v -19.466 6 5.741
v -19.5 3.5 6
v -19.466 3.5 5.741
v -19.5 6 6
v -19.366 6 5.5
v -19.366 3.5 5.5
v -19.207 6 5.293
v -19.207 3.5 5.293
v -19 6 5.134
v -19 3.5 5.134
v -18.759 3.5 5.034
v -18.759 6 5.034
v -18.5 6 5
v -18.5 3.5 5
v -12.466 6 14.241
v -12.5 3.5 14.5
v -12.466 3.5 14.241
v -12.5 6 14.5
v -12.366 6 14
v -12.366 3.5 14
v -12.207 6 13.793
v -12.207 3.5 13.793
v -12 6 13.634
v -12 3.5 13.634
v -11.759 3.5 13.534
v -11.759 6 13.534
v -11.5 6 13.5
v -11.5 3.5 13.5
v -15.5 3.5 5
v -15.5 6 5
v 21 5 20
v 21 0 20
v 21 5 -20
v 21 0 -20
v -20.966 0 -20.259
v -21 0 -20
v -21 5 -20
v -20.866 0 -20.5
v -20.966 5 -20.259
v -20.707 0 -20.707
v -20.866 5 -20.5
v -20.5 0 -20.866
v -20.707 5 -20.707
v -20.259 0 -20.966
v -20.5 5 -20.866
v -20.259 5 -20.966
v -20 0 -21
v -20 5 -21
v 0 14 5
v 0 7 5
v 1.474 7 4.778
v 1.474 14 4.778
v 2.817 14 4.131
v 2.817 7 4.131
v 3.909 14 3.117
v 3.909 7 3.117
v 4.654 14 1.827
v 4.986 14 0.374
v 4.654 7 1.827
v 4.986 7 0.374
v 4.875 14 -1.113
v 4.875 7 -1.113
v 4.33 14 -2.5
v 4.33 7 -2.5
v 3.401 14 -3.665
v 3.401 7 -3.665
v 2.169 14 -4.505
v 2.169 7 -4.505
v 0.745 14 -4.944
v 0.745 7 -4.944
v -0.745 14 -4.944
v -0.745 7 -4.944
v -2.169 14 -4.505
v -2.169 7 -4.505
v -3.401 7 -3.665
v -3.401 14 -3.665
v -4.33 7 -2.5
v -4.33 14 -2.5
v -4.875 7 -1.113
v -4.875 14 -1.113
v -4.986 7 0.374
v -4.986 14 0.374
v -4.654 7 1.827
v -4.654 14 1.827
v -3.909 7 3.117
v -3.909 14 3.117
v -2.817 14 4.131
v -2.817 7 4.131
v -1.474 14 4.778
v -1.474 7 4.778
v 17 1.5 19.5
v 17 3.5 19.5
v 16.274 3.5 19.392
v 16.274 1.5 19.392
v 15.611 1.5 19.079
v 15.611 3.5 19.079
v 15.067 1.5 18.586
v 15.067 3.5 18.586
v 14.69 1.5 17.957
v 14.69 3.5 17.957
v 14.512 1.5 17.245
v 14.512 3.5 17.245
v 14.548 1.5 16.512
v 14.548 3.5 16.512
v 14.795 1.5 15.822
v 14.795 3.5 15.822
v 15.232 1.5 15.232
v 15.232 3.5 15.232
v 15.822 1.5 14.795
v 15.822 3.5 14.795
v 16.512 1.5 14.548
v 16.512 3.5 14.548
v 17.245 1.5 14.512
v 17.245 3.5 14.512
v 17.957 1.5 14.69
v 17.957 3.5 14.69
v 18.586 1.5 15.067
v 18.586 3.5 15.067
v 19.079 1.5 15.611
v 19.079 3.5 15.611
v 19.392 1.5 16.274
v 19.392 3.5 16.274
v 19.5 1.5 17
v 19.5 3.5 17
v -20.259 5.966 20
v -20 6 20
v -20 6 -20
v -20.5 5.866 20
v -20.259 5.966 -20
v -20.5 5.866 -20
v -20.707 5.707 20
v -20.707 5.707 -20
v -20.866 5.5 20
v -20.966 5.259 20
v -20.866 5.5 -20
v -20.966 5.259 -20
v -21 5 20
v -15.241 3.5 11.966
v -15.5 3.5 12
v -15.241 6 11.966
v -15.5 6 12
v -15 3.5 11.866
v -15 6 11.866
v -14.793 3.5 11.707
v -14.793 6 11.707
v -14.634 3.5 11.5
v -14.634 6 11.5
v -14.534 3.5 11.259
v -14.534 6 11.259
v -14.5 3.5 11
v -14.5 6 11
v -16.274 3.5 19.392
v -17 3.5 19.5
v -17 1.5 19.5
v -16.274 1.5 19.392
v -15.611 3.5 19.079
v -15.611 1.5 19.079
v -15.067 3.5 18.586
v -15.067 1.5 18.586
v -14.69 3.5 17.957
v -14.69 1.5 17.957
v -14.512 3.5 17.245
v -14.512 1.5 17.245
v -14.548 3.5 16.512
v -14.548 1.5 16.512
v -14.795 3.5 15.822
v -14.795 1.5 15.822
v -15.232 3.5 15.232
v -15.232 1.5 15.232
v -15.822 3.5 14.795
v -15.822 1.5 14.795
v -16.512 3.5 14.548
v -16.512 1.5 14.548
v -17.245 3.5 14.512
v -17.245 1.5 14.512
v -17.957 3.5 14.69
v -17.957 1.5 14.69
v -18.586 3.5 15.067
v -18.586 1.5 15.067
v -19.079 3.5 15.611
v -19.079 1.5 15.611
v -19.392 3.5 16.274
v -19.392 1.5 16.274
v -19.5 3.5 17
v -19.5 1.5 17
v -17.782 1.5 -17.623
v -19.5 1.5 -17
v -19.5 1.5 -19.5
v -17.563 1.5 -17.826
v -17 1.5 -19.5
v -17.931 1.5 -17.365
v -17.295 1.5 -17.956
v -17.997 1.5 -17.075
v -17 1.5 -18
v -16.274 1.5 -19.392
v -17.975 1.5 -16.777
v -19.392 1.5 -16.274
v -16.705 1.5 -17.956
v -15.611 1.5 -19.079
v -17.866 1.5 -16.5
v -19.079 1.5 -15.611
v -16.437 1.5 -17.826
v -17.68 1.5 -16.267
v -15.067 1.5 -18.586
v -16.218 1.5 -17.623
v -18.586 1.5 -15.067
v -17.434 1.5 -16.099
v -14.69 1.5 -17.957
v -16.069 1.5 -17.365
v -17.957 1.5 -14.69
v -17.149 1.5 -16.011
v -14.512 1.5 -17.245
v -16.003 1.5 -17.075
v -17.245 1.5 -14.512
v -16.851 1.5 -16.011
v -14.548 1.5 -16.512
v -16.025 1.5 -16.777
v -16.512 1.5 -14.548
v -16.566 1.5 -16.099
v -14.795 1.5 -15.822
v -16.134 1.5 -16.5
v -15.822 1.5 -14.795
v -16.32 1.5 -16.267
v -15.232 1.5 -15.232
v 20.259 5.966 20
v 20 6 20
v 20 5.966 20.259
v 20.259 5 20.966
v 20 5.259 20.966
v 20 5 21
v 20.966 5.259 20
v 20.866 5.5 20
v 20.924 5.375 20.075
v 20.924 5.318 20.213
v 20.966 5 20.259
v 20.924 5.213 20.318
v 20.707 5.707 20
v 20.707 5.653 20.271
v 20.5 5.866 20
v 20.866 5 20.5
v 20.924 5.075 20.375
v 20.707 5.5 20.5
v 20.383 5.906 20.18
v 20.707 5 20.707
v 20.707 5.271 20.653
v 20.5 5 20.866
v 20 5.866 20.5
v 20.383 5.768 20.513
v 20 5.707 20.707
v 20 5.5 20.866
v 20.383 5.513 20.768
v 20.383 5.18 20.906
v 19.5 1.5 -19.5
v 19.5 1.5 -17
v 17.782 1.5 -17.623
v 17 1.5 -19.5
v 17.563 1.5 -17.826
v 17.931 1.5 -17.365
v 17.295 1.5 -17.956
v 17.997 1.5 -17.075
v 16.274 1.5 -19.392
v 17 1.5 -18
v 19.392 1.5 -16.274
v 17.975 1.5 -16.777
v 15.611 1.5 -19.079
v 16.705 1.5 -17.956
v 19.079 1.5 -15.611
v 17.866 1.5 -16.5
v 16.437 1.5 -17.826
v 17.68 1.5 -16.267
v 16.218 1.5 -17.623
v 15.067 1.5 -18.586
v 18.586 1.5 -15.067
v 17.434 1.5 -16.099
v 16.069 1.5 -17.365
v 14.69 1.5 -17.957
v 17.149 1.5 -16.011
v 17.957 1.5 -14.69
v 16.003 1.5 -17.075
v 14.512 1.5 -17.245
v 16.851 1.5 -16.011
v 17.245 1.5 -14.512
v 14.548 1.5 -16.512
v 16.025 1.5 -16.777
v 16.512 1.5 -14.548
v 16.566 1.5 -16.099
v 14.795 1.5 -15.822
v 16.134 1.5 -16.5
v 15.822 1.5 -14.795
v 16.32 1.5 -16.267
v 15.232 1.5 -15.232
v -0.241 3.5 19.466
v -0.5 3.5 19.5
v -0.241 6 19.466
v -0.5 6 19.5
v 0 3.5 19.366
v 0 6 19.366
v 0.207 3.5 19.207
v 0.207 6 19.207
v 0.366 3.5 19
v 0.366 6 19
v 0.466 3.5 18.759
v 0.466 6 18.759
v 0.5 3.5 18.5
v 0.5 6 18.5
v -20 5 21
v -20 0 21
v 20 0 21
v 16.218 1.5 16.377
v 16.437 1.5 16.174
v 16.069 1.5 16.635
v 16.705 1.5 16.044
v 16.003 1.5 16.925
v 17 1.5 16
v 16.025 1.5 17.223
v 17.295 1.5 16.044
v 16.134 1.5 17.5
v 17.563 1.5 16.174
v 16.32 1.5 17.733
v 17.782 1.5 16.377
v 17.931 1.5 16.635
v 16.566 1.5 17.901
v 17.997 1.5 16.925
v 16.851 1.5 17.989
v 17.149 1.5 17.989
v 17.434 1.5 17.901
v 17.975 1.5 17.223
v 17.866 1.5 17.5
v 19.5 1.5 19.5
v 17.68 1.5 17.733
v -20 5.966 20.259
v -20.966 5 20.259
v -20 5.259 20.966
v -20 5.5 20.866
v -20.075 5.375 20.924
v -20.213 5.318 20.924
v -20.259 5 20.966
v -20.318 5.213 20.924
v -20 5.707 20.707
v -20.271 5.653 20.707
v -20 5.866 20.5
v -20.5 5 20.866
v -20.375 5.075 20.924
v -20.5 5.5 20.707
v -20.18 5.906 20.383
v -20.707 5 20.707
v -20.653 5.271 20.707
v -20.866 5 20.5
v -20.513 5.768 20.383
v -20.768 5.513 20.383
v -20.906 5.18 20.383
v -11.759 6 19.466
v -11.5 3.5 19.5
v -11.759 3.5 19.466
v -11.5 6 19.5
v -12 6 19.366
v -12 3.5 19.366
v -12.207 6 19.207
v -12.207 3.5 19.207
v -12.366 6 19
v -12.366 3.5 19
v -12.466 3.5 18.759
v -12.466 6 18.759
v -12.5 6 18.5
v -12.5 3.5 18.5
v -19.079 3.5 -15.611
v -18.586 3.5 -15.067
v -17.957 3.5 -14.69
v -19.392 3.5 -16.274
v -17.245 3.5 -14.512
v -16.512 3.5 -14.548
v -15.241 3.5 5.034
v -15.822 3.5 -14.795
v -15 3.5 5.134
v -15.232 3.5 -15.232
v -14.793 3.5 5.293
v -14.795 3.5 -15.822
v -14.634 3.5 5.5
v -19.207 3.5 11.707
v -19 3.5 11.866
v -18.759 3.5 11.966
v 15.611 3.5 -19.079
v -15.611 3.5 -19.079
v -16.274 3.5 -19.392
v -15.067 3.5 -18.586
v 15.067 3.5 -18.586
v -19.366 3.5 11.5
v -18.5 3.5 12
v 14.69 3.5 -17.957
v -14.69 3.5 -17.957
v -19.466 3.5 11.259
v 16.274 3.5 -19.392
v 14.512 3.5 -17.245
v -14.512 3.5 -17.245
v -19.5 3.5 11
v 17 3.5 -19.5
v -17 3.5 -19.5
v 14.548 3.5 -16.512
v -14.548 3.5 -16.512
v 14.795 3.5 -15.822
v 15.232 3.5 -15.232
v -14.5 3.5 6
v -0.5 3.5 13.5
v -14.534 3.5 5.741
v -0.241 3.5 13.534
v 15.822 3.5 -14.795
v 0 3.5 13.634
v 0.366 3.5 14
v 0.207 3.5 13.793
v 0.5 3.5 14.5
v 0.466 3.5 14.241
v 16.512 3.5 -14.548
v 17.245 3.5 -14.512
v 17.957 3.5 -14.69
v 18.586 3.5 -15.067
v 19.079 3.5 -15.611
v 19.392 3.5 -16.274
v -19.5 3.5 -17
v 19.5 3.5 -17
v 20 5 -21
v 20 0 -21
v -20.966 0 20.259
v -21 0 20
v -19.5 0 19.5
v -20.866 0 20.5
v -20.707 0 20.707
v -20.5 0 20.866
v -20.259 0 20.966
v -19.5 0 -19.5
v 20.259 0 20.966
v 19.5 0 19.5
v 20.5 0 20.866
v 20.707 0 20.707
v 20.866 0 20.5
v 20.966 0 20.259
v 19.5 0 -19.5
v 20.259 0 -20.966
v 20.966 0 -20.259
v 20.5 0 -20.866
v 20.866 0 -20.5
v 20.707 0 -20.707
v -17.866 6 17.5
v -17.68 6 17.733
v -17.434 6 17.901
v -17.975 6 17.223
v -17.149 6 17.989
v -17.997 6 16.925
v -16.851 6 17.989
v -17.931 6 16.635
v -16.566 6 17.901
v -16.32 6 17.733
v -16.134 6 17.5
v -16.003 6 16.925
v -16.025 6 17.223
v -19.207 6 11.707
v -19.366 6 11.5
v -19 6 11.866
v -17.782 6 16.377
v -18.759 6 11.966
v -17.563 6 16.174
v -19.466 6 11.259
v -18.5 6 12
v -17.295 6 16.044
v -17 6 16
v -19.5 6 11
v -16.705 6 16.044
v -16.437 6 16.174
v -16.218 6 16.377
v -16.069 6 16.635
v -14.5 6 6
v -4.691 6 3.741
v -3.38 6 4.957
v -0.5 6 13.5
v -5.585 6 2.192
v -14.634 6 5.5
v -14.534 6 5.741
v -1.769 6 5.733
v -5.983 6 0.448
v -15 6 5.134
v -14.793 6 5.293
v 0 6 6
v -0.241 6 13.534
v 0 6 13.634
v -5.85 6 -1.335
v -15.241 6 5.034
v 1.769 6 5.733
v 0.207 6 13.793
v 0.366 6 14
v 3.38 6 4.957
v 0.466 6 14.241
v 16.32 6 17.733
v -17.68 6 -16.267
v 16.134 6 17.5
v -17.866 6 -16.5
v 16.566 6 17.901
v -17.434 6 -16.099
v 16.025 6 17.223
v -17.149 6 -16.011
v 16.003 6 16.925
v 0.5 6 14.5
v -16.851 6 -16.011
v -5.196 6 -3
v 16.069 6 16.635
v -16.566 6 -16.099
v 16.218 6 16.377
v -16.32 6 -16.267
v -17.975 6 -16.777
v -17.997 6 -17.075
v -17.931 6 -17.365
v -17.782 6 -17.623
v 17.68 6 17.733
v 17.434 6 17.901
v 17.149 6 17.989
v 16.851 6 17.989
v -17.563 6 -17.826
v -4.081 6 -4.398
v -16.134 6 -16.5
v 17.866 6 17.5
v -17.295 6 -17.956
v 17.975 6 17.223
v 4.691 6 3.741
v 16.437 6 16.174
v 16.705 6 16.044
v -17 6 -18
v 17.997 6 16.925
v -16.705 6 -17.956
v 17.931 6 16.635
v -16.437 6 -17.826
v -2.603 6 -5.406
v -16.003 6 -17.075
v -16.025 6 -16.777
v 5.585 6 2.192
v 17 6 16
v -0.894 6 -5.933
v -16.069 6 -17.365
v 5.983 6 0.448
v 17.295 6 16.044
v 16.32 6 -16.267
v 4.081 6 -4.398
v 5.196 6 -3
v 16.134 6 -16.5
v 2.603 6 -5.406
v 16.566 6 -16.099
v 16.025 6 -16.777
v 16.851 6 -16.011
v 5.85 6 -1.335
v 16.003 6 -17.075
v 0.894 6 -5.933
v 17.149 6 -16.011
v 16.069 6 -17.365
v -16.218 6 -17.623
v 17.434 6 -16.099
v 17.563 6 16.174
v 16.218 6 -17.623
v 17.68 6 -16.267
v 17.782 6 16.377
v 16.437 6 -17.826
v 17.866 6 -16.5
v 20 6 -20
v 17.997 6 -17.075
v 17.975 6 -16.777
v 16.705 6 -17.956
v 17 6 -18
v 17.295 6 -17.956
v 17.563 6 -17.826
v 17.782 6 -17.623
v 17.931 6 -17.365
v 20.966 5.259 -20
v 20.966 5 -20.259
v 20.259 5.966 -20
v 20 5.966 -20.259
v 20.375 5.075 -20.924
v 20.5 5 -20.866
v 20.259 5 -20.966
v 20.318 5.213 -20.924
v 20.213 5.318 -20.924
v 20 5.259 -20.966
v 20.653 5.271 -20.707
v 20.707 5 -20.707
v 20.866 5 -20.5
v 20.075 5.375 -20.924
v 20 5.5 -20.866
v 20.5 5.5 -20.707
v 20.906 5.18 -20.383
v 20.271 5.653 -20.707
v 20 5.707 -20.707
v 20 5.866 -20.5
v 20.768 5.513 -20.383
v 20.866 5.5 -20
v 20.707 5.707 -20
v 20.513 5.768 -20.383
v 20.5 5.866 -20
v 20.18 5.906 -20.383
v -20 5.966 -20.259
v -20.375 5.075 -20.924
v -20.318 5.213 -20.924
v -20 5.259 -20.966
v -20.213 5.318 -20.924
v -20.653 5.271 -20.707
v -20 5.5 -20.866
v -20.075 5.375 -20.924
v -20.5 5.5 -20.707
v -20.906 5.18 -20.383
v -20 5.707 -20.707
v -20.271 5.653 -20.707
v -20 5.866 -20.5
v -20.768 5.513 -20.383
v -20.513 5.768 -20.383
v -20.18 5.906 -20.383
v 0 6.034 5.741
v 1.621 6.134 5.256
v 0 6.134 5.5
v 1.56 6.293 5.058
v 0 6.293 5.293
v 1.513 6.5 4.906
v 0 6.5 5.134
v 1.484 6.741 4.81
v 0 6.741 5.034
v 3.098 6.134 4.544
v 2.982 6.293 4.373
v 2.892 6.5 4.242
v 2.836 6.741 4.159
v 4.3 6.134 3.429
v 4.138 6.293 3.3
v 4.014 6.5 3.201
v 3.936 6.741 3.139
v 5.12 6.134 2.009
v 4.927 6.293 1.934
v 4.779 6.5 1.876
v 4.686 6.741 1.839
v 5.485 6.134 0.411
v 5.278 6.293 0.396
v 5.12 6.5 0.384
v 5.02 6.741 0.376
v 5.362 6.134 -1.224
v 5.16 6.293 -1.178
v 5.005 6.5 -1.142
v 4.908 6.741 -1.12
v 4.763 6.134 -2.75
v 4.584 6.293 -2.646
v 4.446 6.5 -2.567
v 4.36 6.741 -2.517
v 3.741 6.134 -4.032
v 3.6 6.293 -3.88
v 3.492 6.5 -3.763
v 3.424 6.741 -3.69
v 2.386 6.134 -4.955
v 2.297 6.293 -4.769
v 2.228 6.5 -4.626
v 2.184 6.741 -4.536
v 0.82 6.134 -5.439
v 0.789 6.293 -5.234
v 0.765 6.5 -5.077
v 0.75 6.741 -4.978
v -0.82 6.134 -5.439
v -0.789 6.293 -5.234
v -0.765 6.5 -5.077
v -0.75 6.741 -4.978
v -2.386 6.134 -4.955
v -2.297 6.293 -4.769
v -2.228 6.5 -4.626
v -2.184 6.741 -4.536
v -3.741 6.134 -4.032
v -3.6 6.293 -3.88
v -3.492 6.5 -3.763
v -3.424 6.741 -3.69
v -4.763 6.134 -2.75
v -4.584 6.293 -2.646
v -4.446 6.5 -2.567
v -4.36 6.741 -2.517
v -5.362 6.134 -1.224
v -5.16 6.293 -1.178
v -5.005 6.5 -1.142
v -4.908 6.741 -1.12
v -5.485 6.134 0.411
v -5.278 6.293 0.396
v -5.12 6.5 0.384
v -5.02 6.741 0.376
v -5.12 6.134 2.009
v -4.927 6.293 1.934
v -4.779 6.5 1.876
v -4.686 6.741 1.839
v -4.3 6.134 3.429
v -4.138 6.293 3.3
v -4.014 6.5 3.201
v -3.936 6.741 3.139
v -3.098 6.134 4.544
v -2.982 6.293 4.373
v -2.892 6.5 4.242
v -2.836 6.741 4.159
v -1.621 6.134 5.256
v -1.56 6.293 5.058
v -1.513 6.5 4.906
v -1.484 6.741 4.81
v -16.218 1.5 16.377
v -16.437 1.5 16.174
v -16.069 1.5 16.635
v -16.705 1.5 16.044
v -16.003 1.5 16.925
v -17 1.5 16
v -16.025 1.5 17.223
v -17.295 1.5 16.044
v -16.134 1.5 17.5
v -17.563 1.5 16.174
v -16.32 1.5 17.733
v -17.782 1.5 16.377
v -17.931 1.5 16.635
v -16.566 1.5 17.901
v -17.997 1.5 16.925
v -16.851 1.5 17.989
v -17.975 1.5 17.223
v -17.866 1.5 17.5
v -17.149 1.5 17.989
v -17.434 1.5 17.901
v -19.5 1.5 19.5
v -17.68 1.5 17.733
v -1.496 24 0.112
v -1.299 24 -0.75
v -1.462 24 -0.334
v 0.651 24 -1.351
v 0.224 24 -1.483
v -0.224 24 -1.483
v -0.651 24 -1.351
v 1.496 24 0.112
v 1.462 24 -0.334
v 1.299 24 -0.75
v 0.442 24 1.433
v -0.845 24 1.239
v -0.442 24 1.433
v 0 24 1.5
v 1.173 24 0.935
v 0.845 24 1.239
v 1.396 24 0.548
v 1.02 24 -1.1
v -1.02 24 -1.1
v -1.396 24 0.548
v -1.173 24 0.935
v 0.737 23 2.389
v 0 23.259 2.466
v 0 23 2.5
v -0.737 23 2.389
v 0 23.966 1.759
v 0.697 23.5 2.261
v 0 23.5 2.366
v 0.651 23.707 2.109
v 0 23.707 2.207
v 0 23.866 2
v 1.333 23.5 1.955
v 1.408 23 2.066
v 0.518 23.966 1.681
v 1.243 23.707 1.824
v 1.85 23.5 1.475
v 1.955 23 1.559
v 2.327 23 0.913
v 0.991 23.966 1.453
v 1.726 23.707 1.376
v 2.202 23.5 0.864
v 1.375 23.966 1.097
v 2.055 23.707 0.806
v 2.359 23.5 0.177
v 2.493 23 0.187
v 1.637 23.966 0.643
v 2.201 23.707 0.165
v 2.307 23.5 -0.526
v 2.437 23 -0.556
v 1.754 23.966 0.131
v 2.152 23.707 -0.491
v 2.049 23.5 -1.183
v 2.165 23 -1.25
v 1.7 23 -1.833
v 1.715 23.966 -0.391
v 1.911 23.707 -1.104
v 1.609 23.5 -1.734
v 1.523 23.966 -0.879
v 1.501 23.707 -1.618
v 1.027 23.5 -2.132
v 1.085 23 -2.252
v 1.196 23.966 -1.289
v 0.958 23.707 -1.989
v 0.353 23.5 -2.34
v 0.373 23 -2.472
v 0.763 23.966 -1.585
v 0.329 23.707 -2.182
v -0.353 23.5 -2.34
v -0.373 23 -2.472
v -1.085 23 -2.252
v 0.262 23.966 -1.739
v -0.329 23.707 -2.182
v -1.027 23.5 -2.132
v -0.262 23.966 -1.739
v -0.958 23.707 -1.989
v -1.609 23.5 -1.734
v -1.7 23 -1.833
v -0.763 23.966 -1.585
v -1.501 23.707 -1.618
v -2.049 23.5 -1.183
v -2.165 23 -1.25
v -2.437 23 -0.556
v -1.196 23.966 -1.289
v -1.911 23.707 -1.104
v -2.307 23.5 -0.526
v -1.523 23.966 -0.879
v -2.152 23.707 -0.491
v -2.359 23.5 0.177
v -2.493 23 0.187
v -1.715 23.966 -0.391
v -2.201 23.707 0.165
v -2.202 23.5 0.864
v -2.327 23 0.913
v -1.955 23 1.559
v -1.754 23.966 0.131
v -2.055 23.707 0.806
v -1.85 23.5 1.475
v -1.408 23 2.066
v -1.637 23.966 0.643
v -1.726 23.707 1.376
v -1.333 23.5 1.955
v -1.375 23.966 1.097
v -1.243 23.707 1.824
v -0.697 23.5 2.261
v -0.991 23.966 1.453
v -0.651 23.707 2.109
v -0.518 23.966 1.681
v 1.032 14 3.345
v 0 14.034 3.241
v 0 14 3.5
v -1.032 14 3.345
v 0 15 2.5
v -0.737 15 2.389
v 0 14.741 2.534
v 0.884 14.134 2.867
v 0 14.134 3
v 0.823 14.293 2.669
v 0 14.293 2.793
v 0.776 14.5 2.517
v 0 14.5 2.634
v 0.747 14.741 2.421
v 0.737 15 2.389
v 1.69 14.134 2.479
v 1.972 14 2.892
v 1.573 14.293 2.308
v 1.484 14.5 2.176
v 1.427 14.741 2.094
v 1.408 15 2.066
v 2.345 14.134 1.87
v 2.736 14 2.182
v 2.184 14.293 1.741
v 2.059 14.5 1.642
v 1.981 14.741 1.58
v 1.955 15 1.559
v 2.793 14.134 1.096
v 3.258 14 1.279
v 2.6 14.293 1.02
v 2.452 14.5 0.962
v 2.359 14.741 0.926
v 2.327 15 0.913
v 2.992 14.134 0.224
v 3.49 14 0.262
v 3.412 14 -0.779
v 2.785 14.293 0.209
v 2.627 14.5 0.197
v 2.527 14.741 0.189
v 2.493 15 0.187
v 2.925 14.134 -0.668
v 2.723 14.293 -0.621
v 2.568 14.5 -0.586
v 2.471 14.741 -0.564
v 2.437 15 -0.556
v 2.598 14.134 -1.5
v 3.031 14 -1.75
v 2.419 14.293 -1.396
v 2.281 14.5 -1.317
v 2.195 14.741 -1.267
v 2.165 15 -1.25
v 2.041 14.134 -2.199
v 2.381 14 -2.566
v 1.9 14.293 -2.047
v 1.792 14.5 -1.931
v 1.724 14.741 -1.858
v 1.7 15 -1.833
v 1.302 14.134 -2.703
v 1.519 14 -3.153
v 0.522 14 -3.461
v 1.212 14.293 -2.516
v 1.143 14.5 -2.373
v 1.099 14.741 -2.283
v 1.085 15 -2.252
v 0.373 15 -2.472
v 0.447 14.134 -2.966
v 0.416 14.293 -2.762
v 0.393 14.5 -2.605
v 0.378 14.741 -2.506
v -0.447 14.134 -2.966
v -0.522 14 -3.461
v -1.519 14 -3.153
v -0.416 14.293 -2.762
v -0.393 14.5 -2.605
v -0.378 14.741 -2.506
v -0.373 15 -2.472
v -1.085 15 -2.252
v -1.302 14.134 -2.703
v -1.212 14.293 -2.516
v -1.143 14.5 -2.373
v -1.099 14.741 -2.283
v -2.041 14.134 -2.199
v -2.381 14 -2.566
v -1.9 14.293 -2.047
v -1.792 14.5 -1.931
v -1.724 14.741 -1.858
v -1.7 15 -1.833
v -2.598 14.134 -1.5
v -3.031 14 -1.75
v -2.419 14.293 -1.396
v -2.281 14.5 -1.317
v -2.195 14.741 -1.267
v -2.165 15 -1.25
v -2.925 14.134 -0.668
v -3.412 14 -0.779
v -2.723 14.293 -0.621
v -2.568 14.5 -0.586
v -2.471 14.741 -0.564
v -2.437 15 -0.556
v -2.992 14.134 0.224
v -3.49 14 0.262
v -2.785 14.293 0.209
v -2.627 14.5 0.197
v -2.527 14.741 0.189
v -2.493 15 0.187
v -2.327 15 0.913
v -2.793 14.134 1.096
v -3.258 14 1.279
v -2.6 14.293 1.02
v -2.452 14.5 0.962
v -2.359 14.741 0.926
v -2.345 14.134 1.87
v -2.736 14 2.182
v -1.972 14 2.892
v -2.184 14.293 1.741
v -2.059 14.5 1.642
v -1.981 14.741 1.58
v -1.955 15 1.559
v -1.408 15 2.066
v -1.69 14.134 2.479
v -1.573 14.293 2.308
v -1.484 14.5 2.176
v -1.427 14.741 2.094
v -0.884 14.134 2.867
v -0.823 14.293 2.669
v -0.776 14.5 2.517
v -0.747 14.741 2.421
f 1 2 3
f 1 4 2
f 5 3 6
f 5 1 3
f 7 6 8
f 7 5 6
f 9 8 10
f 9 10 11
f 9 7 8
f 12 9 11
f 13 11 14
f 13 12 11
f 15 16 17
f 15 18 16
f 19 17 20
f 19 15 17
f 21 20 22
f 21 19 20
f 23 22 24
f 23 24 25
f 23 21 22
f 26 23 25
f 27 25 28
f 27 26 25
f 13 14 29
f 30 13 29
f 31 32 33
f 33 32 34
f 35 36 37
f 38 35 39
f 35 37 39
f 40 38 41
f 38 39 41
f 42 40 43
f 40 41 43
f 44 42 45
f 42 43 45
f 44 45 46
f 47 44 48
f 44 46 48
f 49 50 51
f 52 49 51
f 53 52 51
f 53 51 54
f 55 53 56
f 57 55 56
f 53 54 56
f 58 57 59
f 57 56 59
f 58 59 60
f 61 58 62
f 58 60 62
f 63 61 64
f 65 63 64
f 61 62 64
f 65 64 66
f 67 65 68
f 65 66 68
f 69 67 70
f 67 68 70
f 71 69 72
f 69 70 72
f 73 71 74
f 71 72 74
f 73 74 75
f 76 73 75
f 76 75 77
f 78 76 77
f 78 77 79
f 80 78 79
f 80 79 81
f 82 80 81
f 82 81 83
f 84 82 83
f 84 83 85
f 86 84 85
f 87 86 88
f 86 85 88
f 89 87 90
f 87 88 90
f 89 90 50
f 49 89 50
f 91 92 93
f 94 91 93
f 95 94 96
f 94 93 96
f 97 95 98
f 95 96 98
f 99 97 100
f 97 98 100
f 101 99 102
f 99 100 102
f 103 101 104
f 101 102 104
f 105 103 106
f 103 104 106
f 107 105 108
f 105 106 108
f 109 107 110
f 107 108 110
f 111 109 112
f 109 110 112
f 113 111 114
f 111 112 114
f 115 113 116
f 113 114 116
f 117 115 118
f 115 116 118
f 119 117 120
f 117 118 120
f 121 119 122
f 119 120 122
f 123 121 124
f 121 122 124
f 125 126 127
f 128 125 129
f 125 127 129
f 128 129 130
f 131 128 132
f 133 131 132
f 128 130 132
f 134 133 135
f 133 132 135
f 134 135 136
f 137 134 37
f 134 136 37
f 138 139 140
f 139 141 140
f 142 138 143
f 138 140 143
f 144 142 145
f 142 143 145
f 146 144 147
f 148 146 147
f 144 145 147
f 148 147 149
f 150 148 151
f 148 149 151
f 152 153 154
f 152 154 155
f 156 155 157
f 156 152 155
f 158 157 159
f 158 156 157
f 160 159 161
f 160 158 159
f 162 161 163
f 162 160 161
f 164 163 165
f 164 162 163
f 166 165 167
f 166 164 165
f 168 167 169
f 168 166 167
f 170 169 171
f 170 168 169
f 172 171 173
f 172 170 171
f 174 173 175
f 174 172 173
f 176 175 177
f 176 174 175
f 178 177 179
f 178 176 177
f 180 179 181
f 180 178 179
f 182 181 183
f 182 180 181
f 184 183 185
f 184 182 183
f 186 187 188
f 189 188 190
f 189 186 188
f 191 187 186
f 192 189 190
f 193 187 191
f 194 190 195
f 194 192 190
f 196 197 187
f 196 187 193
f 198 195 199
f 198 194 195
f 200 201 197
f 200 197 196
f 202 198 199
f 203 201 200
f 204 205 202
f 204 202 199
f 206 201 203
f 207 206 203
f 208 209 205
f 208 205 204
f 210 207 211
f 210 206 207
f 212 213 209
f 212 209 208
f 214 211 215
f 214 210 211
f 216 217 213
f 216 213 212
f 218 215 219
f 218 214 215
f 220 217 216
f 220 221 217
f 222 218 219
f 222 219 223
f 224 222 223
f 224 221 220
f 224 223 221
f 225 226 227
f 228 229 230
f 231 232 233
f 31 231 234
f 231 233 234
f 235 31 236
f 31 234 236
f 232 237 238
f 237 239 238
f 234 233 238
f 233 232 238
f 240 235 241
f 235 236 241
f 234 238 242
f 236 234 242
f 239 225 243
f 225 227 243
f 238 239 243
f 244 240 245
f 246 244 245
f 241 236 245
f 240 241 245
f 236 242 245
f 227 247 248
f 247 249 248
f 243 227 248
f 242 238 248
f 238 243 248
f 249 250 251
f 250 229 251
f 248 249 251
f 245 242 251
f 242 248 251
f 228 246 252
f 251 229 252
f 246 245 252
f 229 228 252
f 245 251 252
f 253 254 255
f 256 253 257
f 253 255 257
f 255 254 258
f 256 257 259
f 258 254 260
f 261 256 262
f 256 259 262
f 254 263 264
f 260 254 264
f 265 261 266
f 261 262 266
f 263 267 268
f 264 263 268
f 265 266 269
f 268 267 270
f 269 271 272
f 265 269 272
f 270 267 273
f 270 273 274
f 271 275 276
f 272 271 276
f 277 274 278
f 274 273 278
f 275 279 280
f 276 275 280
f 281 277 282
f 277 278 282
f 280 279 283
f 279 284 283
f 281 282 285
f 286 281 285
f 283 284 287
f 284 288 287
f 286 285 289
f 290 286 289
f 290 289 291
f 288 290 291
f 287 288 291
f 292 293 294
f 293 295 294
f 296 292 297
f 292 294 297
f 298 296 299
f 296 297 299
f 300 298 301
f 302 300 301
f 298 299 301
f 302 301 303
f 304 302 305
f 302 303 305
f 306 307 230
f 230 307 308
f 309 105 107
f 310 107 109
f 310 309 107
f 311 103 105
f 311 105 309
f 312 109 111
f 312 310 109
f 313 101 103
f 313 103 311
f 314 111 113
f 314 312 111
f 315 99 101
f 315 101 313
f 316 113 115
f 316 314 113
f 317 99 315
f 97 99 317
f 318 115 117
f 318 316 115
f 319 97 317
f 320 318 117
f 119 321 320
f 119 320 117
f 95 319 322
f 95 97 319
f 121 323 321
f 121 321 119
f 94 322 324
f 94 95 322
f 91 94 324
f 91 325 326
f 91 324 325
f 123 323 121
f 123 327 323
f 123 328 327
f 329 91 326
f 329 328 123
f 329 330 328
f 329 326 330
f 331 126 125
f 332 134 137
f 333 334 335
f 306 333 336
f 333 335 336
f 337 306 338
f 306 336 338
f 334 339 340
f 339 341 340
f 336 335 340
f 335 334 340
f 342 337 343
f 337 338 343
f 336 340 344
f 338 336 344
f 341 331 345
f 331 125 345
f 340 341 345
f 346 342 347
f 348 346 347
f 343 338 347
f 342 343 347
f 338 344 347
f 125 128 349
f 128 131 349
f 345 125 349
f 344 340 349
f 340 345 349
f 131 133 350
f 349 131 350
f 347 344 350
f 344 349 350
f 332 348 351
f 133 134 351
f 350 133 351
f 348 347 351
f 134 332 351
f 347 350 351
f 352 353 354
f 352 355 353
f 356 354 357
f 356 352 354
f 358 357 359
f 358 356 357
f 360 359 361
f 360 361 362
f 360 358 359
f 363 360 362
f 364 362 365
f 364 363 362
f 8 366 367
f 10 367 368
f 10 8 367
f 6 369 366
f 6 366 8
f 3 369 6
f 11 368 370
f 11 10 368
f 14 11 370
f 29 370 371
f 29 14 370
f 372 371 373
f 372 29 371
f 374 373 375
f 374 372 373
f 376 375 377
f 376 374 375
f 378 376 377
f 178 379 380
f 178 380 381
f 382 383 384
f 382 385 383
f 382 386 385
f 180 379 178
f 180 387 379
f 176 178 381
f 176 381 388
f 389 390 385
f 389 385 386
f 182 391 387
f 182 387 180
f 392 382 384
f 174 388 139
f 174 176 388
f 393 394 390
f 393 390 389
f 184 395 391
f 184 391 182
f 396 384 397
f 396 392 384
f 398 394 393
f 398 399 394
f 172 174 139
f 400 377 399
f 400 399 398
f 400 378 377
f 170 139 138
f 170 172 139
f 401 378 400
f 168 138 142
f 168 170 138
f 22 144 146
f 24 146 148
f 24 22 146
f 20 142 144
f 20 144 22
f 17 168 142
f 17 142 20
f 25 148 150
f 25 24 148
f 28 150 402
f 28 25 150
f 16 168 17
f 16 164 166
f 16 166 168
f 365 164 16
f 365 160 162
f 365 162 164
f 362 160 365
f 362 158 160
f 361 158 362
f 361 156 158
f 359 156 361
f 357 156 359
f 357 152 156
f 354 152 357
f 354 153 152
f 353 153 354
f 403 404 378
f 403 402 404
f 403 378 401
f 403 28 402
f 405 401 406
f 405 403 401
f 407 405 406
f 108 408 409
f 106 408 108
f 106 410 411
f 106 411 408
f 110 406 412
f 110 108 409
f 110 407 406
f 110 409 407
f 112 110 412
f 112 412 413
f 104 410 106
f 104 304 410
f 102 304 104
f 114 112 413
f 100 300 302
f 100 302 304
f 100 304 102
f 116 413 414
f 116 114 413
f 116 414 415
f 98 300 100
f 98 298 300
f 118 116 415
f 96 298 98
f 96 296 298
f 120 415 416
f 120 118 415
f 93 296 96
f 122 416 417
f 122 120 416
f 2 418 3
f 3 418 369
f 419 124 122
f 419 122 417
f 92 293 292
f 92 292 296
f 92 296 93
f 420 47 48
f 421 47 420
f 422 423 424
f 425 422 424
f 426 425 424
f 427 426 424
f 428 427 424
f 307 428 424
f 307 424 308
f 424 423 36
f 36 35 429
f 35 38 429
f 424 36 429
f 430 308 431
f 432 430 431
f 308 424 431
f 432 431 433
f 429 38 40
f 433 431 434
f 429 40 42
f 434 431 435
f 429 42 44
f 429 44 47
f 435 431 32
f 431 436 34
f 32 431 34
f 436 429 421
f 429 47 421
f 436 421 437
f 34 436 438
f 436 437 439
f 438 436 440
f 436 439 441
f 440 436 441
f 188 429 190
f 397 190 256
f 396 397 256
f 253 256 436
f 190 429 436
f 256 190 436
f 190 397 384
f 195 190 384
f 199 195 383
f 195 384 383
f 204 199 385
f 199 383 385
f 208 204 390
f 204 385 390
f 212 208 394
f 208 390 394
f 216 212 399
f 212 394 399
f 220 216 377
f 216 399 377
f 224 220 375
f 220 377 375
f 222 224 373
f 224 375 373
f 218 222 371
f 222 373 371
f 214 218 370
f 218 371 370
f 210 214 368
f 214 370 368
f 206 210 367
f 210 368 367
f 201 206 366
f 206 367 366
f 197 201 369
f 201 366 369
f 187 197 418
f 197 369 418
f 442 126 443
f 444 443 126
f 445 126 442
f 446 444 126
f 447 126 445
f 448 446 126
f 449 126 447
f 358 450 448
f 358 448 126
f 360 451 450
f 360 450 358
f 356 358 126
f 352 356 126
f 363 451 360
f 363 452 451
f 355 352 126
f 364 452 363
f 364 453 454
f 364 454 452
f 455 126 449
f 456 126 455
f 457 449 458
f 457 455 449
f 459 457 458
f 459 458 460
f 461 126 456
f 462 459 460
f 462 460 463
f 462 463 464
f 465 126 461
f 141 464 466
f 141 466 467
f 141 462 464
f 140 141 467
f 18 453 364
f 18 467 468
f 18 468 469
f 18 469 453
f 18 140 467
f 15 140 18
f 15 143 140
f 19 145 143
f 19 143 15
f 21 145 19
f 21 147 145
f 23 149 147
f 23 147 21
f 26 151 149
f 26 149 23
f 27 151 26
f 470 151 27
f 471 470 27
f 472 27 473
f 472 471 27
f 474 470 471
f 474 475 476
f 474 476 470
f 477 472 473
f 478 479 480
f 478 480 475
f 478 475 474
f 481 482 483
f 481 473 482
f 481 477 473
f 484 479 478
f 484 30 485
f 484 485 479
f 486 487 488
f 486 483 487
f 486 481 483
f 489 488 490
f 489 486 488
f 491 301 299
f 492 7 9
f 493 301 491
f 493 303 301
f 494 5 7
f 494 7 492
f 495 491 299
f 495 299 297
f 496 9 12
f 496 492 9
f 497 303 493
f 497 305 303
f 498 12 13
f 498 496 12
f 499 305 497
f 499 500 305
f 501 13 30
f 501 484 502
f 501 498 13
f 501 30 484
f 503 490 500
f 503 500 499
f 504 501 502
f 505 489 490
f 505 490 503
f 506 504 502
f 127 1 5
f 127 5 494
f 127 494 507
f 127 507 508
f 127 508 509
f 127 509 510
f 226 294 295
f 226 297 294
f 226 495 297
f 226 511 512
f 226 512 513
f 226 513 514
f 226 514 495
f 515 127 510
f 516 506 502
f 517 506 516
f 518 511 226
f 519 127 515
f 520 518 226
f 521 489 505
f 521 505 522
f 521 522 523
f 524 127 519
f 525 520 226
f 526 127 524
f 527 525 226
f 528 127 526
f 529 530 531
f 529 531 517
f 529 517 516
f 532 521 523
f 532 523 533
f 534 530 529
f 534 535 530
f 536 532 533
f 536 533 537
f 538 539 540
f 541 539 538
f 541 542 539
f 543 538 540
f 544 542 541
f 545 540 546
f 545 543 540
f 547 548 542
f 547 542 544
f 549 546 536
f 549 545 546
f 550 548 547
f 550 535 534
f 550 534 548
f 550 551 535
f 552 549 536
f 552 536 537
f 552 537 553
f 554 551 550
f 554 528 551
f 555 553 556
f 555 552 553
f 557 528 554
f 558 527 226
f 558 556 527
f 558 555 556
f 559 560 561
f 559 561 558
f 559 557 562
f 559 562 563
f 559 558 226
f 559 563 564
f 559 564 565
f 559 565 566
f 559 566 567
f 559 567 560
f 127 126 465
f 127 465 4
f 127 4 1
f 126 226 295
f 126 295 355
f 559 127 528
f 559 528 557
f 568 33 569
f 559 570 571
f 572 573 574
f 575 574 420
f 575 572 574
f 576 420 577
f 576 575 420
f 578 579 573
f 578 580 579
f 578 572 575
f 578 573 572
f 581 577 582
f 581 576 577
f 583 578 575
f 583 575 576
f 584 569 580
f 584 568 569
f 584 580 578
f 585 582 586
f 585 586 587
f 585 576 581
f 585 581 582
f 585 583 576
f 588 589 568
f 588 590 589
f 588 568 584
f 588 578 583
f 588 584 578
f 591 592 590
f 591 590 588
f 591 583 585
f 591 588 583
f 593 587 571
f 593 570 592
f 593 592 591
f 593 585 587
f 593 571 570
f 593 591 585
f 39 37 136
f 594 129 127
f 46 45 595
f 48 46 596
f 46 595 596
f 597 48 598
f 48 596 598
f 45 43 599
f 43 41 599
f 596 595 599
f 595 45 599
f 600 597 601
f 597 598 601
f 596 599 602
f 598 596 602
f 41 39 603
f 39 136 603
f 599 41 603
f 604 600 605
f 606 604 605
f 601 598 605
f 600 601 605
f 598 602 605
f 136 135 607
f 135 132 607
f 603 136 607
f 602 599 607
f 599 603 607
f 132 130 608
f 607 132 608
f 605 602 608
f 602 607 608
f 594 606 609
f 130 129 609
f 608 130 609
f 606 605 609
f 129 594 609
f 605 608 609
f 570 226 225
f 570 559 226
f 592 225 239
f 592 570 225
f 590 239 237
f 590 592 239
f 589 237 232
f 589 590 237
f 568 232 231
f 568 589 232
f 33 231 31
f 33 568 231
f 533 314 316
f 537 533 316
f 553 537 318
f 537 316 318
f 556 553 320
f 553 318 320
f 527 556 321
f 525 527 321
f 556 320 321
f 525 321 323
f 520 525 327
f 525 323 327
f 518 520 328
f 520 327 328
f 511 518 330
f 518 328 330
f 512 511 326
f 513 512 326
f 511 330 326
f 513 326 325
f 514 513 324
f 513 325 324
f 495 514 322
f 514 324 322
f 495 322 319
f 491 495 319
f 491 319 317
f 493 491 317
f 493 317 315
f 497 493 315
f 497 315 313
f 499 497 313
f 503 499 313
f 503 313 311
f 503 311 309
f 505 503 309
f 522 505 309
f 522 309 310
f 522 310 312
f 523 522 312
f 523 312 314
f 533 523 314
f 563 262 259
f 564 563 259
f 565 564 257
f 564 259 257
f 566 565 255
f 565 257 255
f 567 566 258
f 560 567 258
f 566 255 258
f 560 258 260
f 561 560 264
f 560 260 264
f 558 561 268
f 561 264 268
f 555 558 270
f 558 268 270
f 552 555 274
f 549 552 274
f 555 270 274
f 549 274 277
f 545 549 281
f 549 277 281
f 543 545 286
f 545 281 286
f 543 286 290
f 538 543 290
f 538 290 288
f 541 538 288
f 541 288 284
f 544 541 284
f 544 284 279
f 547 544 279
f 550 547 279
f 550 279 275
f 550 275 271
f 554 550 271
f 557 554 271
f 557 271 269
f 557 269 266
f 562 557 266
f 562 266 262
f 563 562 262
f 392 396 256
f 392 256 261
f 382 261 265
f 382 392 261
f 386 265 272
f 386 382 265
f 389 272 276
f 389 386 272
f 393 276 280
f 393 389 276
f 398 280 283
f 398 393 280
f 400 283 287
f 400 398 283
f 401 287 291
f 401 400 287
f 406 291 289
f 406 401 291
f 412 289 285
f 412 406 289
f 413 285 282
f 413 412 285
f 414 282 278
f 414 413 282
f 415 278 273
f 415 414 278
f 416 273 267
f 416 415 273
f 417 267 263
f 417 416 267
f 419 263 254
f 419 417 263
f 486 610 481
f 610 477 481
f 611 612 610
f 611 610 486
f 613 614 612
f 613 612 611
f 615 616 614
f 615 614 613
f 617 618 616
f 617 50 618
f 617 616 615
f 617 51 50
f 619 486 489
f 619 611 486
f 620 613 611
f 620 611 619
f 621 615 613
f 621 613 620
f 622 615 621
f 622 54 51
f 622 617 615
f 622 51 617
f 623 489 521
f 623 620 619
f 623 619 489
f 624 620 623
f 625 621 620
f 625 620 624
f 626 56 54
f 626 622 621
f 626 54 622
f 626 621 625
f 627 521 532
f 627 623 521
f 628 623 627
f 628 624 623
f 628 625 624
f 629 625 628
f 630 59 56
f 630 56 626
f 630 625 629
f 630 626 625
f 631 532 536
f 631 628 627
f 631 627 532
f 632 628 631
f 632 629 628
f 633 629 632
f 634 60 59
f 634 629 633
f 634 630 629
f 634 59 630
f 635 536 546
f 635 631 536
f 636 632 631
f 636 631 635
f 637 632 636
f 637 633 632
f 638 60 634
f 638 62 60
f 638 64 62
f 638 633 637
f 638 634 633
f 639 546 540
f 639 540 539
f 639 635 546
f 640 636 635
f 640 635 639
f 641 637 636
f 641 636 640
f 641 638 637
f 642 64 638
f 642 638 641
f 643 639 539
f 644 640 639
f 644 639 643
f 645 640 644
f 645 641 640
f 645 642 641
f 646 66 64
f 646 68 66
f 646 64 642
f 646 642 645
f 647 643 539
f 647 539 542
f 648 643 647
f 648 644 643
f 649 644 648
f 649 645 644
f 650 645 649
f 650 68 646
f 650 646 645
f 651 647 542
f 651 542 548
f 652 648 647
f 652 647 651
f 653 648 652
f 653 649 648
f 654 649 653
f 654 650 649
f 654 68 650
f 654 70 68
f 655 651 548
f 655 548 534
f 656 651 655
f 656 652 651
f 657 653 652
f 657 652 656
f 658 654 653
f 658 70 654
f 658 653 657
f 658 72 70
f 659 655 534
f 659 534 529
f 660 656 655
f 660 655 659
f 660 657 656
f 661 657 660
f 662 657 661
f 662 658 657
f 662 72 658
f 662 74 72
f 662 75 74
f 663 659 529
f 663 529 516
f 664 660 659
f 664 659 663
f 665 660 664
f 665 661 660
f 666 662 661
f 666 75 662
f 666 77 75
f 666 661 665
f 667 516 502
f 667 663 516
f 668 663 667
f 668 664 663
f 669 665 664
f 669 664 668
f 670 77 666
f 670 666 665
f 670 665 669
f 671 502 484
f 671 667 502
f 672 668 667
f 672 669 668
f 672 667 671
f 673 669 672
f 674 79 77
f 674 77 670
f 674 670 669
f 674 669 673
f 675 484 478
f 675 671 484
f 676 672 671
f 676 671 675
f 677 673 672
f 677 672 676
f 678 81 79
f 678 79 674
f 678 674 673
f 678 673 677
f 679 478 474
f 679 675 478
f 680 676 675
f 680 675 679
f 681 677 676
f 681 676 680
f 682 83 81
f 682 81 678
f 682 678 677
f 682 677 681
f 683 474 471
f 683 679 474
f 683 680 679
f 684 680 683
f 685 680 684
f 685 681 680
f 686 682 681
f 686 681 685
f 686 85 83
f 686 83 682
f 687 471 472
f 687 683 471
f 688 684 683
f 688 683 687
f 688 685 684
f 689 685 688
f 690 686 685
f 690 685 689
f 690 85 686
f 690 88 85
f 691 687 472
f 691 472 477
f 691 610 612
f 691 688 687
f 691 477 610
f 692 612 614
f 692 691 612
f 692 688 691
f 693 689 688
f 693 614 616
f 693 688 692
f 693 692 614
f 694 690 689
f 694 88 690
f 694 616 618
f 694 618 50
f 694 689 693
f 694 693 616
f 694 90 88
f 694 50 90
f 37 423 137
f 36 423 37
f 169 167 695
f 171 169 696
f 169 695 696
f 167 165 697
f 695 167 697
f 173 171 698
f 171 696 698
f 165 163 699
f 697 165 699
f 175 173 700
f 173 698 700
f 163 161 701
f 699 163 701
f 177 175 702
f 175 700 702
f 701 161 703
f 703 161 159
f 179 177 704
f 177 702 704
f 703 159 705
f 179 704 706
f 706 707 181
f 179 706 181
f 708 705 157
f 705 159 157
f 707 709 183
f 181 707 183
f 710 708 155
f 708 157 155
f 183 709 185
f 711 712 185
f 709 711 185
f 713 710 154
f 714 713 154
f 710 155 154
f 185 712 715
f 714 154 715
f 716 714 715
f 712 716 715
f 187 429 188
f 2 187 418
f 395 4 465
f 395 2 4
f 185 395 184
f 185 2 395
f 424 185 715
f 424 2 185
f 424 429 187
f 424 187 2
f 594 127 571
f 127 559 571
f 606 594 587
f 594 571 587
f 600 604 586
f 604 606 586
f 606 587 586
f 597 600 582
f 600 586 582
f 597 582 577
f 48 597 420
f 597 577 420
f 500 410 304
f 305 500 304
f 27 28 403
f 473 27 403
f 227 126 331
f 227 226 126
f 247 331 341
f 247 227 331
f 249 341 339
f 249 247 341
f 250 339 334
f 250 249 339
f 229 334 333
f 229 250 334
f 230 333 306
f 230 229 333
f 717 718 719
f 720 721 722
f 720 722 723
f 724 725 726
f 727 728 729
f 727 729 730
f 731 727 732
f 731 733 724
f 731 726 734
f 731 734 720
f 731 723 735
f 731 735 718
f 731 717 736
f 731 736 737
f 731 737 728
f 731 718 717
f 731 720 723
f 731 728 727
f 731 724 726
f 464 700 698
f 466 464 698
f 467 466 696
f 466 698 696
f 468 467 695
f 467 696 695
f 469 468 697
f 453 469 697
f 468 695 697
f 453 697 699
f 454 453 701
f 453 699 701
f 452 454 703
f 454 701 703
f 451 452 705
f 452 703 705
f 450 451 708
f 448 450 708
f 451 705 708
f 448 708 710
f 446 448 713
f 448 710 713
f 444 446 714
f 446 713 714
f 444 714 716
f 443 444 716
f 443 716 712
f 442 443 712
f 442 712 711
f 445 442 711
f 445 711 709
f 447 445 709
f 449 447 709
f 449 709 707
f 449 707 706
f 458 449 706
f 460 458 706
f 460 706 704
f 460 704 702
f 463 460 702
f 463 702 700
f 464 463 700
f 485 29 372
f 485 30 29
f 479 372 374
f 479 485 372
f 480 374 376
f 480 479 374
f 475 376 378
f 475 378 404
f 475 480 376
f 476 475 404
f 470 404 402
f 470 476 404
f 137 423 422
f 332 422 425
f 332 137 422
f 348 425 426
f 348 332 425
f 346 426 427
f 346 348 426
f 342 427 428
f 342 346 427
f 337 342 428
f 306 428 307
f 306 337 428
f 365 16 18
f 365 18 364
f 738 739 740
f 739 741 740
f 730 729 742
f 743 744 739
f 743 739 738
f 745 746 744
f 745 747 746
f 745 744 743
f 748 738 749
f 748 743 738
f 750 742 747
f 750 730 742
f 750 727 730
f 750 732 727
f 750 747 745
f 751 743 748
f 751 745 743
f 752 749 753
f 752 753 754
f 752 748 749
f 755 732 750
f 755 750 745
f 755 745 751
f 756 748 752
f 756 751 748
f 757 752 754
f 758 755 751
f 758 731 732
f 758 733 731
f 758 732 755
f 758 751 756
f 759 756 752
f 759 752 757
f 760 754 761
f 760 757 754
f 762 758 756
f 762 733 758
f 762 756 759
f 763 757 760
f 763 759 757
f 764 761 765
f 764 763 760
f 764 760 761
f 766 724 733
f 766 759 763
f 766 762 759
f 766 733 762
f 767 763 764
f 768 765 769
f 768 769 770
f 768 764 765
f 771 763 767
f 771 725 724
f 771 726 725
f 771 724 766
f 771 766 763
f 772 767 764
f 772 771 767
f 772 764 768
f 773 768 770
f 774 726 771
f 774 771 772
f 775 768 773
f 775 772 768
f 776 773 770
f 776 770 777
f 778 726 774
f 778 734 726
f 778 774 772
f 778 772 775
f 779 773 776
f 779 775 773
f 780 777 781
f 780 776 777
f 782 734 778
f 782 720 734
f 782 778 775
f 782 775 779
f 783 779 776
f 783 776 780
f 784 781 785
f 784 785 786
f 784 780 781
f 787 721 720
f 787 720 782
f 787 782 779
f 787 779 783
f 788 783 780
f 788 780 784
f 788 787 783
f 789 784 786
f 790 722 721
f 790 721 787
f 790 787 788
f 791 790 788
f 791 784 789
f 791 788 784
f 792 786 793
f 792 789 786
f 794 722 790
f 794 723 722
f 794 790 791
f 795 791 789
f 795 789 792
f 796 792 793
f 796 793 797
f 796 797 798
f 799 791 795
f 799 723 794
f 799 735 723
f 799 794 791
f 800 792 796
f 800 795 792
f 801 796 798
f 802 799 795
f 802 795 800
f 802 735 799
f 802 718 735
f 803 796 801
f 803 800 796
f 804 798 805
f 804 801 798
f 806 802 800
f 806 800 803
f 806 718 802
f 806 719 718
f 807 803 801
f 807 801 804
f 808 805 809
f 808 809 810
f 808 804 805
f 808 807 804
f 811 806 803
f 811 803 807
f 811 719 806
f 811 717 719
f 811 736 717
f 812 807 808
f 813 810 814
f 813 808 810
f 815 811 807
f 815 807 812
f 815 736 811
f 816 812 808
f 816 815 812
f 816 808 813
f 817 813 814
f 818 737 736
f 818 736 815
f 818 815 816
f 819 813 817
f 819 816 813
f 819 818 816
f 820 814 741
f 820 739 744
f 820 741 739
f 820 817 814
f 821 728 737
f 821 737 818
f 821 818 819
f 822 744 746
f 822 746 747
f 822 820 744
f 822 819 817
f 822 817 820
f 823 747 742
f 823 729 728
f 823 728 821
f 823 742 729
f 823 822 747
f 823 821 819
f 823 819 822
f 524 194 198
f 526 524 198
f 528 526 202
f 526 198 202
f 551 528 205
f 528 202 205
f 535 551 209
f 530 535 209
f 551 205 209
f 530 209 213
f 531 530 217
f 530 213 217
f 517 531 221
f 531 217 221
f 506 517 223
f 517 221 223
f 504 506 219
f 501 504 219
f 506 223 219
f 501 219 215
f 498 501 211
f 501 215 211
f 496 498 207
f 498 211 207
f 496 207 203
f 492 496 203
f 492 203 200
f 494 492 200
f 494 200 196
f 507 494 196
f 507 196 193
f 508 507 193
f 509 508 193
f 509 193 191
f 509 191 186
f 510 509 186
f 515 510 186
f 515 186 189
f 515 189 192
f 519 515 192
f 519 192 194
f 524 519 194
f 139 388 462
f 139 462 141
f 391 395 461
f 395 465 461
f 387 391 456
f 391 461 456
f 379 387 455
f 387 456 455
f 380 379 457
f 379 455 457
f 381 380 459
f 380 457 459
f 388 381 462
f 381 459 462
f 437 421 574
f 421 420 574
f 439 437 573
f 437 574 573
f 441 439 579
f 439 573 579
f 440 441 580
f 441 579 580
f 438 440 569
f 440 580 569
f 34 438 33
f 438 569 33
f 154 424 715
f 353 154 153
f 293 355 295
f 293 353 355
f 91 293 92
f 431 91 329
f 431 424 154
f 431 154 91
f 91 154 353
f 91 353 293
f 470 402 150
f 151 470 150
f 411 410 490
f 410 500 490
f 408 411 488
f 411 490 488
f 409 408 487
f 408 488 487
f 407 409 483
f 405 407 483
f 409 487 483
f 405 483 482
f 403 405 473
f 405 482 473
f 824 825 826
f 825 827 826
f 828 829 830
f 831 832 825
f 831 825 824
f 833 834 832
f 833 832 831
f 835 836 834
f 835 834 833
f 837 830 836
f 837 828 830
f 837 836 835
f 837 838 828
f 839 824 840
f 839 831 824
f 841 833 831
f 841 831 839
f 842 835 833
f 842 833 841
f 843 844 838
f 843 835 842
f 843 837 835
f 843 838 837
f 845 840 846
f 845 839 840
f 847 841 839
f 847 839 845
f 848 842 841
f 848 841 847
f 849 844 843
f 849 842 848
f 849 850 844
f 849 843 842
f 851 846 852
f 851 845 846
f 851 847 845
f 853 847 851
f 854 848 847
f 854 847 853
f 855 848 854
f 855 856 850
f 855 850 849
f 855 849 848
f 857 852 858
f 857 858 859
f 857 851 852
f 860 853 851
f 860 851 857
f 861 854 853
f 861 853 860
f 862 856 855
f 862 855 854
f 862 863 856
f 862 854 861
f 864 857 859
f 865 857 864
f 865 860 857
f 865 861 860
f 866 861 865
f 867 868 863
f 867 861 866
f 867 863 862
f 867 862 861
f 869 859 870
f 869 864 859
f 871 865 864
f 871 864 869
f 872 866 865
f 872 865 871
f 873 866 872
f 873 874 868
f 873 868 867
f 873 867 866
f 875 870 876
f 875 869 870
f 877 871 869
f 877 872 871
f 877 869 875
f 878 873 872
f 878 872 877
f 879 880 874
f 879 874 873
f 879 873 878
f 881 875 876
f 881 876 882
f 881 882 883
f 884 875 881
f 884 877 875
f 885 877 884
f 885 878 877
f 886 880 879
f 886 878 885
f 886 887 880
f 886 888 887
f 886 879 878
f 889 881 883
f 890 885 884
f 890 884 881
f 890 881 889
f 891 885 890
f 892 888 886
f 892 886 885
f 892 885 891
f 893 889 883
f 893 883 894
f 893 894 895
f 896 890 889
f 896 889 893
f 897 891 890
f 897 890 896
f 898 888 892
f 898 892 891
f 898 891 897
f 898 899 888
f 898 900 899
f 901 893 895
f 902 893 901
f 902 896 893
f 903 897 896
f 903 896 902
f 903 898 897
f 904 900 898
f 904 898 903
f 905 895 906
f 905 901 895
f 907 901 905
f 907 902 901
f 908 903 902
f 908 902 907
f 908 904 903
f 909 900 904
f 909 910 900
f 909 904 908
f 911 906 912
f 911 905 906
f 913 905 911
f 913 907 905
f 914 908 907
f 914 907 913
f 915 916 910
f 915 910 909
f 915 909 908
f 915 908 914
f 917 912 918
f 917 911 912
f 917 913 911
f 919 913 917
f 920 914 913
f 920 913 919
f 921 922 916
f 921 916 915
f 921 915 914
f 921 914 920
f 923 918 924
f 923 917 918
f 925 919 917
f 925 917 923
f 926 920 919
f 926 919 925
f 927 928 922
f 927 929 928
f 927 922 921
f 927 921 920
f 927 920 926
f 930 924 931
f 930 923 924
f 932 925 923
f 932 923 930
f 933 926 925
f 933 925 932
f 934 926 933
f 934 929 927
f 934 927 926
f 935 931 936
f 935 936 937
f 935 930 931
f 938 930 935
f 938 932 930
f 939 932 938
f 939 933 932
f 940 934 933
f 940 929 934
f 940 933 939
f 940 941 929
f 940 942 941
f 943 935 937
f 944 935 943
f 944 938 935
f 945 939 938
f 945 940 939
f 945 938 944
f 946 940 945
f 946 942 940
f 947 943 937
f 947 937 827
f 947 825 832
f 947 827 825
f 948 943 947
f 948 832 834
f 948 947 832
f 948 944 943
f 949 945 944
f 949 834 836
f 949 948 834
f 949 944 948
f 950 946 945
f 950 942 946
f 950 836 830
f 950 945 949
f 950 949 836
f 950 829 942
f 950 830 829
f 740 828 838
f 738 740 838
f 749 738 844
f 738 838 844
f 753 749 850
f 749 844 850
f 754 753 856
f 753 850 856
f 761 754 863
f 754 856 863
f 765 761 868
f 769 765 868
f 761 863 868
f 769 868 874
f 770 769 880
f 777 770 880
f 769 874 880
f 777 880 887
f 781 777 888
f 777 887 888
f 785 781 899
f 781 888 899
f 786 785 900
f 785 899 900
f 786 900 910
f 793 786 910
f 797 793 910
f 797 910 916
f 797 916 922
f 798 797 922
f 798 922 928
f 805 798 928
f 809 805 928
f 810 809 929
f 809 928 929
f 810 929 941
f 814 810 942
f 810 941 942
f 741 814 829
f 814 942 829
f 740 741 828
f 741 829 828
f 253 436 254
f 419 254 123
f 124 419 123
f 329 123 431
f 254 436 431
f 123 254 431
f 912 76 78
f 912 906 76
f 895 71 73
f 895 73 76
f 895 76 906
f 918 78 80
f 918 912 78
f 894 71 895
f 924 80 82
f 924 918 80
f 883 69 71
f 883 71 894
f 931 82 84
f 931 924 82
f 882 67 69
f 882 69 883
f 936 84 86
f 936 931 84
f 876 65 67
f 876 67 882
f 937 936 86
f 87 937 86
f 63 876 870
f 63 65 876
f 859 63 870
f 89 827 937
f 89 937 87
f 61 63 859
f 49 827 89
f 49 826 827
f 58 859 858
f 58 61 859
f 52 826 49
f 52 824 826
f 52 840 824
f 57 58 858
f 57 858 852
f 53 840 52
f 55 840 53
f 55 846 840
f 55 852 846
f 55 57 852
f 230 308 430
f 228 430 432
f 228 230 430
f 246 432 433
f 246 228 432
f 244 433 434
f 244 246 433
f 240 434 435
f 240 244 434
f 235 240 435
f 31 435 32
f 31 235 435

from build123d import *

# Parameters (mm, degrees)
SKETCH1_W           = 42
SKETCH1_H           = 42
BOSS_EXTRUDE1_DEPTH = 6
SKETCH2_W           = 39
SKETCH2_H           = 39
CUT_EXTRUDE1_DEPTH  = 3.5
CUT_EXTRUDE2_REACH  = 31.904
SKETCH3_W           = 5
SKETCH3_H           = 7
SKETCH3_W_2         = 13
SKETCH3_H_2         = 6
BOSS_EXTRUDE2_DEPTH = 2
SKETCH5_R           = 1
CUT_EXTRUDE3_DEPTH  = 31.037476592
SKETCH6_R           = 5
BOSS_EXTRUDE3_DEPTH = 8
SKETCH7_R           = 2.5
BOSS_EXTRUDE4_DEPTH = 10
FILLET1_R           = 1


with BuildPart() as part:
    # Sketch1 → Boss-Extrude1 (new body)
    with BuildSketch(Plane(origin=(0, 0, 0), x_dir=(1, 0, 0), z_dir=(0, 1, 0))):
        Rectangle(SKETCH1_W, SKETCH1_H)
    extrude(amount=BOSS_EXTRUDE1_DEPTH)

    # Sketch2 → Cut-Extrude1 (cut)
    with BuildSketch(Plane.XZ):
        Rectangle(SKETCH2_W, SKETCH2_H)
    extrude(amount=-CUT_EXTRUDE1_DEPTH, mode=Mode.SUBTRACT)

    # Sketch3 → Cut-Extrude2 (cut, up to next)
    with BuildSketch(Plane.XZ.offset(-3.5), mode=Mode.PRIVATE) as cut_extrude2_sk1:
        with Locations((-17, 8.5)):
            Rectangle(SKETCH3_W, SKETCH3_H)
    cut_extrude2_tool1 = extrude(cut_extrude2_sk1.sketch, amount=-CUT_EXTRUDE2_REACH, mode=Mode.PRIVATE) & part.part
    # Sketch3 → Cut-Extrude2 (cut, up to next)
    with BuildSketch(Plane.XZ.offset(-3.5), mode=Mode.PRIVATE) as cut_extrude2_sk2:
        with Locations((-6, 16.5)):
            Rectangle(SKETCH3_W_2, SKETCH3_H_2)
    cut_extrude2_tool2 = extrude(cut_extrude2_sk2.sketch, amount=-CUT_EXTRUDE2_REACH, mode=Mode.PRIVATE) & part.part
    add(cut_extrude2_tool1.solids().sort_by_distance((-17, 3.5, 8.5))[0], mode=Mode.SUBTRACT)
    add(cut_extrude2_tool2.solids().sort_by_distance((-6, 3.5, 16.5))[0], mode=Mode.SUBTRACT)

    # Sketch4 → Boss-Extrude2 (add)
    with BuildSketch(Plane.XZ.offset(-3.5)):
        with BuildLine():
            Line((-19.5, 17), (-19.5, 19.5))
            Line((-19.5, 19.5), (-17, 19.5))
            ThreePointArc((-17, 19.5), (-15.232233047, 15.232233047), (-19.5, 17))
        make_face()
        with BuildLine():
            Line((19.5, 19.5), (17, 19.5))
            ThreePointArc((17, 19.5), (15.232233047, 15.232233047), (19.5, 17))
            Line((19.5, 17), (19.5, 19.5))
        make_face()
        with BuildLine():
            Line((-19.5, -19.5), (-17, -19.5))
            ThreePointArc((-17, -19.5), (-15.232233047, -15.232233047), (-19.5, -17))
            Line((-19.5, -17), (-19.5, -19.5))
        make_face()
        with BuildLine():
            Line((19.5, -17), (19.5, -19.5))
            Line((19.5, -19.5), (17, -19.5))
            ThreePointArc((17, -19.5), (15.232233047, -15.232233047), (19.5, -17))
        make_face()
    extrude(amount=BOSS_EXTRUDE2_DEPTH)

    # Sketch5 → Cut-Extrude3 (cut, through all)
    with BuildSketch(Plane.XZ.offset(-1.5)):
        with Locations(Location((-17, 17, 0), (0, 0, 270))):
            Circle(SKETCH5_R)
        with Locations(Location((17, 17, 0), (0, 0, 270))):
            Circle(SKETCH5_R)
        with Locations(Location((17, -17, 0), (0, 0, 270))):
            Circle(SKETCH5_R)
        with Locations(Location((-17, -17, 0), (0, 0, 270))):
            Circle(SKETCH5_R)
    extrude(amount=-CUT_EXTRUDE3_DEPTH, mode=Mode.SUBTRACT)

    # Sketch6 → Boss-Extrude3 (add)
    with BuildSketch(Plane(origin=(0, 6, 0), x_dir=(1, 0, 0), z_dir=(0, 1, 0))):
        with Locations(Location((0, 0, 0), (0, 0, 270))):
            Circle(SKETCH6_R)
    extrude(amount=BOSS_EXTRUDE3_DEPTH)

    # Sketch7 → Boss-Extrude4 (add)
    with BuildSketch(Plane(origin=(0, 14, 0), x_dir=(1, 0, 0), z_dir=(0, 1, 0))):
        with Locations(Location((0, 0, 0), (0, 0, 270))):
            Circle(SKETCH7_R)
    extrude(amount=BOSS_EXTRUDE4_DEPTH)

    # Fillet1
    fillet1_edges = [part.edges().sort_by_distance(p)[0] for p in [
        (0, 6, -5),
        (0, 14, -2.5),
        (0, 24, -2.5),
        (-21, 6, 0),
        (0, 6, 21),
        (-14.5, 4.75, 12),
        (-14.5, 4.75, 5),
        (-19.5, 4.75, 5),
        (-19.5, 4.75, 12),
        (0.5, 4.75, 19.5),
        (0.5, 4.75, 13.5),
        (-12.5, 4.75, 13.5),
        (-12.5, 4.75, 19.5),
        (21, 6, 0),
        (21, 3, 21),
        (-21, 3, 21),
        (-21, 3, -21),
        (21, 3, -21),
        (0, 6, -21),
    ]]
    fillet(fillet1_edges, radius=FILLET1_R)


solid = part.part
